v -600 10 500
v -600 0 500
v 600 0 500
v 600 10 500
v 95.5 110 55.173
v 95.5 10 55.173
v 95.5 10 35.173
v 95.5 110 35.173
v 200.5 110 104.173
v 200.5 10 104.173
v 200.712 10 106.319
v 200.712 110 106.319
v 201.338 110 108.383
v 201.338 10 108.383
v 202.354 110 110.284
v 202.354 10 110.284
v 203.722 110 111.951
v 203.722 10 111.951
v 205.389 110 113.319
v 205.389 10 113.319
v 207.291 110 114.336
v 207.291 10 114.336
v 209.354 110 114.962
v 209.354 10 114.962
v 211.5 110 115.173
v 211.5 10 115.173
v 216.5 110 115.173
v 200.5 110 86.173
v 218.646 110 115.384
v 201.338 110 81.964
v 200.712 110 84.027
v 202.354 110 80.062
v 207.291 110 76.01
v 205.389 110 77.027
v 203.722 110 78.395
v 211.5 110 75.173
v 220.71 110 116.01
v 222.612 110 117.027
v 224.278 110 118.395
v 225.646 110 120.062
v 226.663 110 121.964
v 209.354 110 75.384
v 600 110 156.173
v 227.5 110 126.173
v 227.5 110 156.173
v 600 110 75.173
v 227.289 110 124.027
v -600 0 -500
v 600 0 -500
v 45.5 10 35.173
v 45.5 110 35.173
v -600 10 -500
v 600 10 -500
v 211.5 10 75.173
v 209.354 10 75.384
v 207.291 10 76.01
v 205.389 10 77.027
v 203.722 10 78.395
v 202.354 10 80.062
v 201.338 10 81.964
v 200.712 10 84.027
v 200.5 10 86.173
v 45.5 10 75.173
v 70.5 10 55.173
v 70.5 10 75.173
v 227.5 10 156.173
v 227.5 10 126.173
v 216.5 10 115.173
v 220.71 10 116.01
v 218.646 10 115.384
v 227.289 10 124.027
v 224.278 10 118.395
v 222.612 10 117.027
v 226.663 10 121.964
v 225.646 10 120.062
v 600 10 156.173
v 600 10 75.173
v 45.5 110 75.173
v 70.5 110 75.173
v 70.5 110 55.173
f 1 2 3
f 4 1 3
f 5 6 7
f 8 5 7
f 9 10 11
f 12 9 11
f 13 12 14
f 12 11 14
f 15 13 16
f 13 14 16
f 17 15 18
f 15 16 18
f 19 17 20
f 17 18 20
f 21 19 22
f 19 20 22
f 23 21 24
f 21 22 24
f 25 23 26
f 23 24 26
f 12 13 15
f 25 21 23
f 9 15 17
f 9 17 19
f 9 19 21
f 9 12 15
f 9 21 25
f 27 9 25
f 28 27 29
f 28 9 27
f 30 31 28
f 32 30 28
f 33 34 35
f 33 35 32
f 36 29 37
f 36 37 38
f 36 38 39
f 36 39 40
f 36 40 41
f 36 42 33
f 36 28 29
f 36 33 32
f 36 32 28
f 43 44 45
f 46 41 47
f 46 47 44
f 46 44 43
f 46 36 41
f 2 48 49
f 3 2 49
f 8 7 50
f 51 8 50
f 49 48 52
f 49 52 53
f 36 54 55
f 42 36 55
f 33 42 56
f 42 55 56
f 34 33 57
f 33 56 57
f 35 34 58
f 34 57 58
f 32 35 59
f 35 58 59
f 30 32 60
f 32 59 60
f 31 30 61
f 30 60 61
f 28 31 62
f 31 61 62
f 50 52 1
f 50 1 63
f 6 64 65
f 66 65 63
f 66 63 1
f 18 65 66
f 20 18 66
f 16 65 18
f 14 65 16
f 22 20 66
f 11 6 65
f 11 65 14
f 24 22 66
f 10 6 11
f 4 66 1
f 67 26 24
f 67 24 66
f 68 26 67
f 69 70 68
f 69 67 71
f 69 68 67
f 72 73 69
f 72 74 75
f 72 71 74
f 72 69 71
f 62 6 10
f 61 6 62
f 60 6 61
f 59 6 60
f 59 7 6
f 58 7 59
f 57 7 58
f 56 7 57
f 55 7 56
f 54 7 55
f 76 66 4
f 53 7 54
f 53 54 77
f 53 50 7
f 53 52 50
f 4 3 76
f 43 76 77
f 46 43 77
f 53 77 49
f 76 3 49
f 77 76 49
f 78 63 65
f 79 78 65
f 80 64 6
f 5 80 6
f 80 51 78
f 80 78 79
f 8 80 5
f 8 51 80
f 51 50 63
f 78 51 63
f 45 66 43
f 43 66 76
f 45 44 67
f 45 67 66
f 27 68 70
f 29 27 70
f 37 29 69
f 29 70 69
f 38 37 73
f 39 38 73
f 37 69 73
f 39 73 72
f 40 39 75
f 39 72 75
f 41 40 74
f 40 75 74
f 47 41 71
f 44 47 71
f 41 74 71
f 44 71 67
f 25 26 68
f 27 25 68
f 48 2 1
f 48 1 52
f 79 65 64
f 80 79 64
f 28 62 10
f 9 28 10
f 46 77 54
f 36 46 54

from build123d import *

# Parameters (mm, degrees)
SKETCH2_W           = 1200
SKETCH2_H           = 1000
BOSS_EXTRUDE1_DEPTH = 10
BOSS_EXTRUDE2_DEPTH = 100
BOSS_EXTRUDE3_DEPTH = 100


with BuildPart() as part:
    # Sketch2 → Boss-Extrude1 (new body)
    with BuildSketch(Plane(origin=(0, 0, 0), x_dir=(1, 0, 0), z_dir=(0, 1, 0))):
        Rectangle(SKETCH2_W, SKETCH2_H)
    extrude(amount=BOSS_EXTRUDE1_DEPTH)

    # Sketch4 → Boss-Extrude2 (add)
    with BuildSketch(Plane(origin=(0, 10, 0), x_dir=(1, 0, 0), z_dir=(0, 1, 0))):
        with BuildLine():
            Line((211.500312891, -115.173130931), (216.500312891, -115.173130931))
            ThreePointArc((216.500312891, -115.173130931), (224.278487484, -118.394956338), (227.500312891, -126.173130931))
            Line((227.500312891, -126.173130931), (227.500312891, -156.173130931))
            Line((227.500312891, -156.173130931), (600, -156.173130931))
            Line((600, -156.173130931), (600, -95.173130931))
            Line((600, -95.173130931), (600, -75.173130931))
            Line((600, -75.173130931), (211.500312891, -75.173130931))
            ThreePointArc((211.500312891, -75.173130931), (203.722138298, -78.394956338), (200.500312891, -86.173130931))
            Line((200.500312891, -86.173130931), (200.500312891, -104.173130931))
            ThreePointArc((200.500312891, -104.173130931), (203.722138298, -111.951305524), (211.500312891, -115.173130931))
        make_face()
    extrude(amount=BOSS_EXTRUDE2_DEPTH)

    # Sketch5 → Boss-Extrude3 (add)
    with BuildSketch(Plane(origin=(0, 10, 0), x_dir=(1, 0, 0), z_dir=(0, 1, 0))):
        Polygon((95.500312891, -55.173130931), (95.500312891, -35.173130931), (45.500312891, -35.173130931), (45.500312891, -75.173130931), (70.500312891, -75.173130931), (70.500312891, -55.173130931), align=None)
    extrude(amount=BOSS_EXTRUDE3_DEPTH)


solid = part.part
